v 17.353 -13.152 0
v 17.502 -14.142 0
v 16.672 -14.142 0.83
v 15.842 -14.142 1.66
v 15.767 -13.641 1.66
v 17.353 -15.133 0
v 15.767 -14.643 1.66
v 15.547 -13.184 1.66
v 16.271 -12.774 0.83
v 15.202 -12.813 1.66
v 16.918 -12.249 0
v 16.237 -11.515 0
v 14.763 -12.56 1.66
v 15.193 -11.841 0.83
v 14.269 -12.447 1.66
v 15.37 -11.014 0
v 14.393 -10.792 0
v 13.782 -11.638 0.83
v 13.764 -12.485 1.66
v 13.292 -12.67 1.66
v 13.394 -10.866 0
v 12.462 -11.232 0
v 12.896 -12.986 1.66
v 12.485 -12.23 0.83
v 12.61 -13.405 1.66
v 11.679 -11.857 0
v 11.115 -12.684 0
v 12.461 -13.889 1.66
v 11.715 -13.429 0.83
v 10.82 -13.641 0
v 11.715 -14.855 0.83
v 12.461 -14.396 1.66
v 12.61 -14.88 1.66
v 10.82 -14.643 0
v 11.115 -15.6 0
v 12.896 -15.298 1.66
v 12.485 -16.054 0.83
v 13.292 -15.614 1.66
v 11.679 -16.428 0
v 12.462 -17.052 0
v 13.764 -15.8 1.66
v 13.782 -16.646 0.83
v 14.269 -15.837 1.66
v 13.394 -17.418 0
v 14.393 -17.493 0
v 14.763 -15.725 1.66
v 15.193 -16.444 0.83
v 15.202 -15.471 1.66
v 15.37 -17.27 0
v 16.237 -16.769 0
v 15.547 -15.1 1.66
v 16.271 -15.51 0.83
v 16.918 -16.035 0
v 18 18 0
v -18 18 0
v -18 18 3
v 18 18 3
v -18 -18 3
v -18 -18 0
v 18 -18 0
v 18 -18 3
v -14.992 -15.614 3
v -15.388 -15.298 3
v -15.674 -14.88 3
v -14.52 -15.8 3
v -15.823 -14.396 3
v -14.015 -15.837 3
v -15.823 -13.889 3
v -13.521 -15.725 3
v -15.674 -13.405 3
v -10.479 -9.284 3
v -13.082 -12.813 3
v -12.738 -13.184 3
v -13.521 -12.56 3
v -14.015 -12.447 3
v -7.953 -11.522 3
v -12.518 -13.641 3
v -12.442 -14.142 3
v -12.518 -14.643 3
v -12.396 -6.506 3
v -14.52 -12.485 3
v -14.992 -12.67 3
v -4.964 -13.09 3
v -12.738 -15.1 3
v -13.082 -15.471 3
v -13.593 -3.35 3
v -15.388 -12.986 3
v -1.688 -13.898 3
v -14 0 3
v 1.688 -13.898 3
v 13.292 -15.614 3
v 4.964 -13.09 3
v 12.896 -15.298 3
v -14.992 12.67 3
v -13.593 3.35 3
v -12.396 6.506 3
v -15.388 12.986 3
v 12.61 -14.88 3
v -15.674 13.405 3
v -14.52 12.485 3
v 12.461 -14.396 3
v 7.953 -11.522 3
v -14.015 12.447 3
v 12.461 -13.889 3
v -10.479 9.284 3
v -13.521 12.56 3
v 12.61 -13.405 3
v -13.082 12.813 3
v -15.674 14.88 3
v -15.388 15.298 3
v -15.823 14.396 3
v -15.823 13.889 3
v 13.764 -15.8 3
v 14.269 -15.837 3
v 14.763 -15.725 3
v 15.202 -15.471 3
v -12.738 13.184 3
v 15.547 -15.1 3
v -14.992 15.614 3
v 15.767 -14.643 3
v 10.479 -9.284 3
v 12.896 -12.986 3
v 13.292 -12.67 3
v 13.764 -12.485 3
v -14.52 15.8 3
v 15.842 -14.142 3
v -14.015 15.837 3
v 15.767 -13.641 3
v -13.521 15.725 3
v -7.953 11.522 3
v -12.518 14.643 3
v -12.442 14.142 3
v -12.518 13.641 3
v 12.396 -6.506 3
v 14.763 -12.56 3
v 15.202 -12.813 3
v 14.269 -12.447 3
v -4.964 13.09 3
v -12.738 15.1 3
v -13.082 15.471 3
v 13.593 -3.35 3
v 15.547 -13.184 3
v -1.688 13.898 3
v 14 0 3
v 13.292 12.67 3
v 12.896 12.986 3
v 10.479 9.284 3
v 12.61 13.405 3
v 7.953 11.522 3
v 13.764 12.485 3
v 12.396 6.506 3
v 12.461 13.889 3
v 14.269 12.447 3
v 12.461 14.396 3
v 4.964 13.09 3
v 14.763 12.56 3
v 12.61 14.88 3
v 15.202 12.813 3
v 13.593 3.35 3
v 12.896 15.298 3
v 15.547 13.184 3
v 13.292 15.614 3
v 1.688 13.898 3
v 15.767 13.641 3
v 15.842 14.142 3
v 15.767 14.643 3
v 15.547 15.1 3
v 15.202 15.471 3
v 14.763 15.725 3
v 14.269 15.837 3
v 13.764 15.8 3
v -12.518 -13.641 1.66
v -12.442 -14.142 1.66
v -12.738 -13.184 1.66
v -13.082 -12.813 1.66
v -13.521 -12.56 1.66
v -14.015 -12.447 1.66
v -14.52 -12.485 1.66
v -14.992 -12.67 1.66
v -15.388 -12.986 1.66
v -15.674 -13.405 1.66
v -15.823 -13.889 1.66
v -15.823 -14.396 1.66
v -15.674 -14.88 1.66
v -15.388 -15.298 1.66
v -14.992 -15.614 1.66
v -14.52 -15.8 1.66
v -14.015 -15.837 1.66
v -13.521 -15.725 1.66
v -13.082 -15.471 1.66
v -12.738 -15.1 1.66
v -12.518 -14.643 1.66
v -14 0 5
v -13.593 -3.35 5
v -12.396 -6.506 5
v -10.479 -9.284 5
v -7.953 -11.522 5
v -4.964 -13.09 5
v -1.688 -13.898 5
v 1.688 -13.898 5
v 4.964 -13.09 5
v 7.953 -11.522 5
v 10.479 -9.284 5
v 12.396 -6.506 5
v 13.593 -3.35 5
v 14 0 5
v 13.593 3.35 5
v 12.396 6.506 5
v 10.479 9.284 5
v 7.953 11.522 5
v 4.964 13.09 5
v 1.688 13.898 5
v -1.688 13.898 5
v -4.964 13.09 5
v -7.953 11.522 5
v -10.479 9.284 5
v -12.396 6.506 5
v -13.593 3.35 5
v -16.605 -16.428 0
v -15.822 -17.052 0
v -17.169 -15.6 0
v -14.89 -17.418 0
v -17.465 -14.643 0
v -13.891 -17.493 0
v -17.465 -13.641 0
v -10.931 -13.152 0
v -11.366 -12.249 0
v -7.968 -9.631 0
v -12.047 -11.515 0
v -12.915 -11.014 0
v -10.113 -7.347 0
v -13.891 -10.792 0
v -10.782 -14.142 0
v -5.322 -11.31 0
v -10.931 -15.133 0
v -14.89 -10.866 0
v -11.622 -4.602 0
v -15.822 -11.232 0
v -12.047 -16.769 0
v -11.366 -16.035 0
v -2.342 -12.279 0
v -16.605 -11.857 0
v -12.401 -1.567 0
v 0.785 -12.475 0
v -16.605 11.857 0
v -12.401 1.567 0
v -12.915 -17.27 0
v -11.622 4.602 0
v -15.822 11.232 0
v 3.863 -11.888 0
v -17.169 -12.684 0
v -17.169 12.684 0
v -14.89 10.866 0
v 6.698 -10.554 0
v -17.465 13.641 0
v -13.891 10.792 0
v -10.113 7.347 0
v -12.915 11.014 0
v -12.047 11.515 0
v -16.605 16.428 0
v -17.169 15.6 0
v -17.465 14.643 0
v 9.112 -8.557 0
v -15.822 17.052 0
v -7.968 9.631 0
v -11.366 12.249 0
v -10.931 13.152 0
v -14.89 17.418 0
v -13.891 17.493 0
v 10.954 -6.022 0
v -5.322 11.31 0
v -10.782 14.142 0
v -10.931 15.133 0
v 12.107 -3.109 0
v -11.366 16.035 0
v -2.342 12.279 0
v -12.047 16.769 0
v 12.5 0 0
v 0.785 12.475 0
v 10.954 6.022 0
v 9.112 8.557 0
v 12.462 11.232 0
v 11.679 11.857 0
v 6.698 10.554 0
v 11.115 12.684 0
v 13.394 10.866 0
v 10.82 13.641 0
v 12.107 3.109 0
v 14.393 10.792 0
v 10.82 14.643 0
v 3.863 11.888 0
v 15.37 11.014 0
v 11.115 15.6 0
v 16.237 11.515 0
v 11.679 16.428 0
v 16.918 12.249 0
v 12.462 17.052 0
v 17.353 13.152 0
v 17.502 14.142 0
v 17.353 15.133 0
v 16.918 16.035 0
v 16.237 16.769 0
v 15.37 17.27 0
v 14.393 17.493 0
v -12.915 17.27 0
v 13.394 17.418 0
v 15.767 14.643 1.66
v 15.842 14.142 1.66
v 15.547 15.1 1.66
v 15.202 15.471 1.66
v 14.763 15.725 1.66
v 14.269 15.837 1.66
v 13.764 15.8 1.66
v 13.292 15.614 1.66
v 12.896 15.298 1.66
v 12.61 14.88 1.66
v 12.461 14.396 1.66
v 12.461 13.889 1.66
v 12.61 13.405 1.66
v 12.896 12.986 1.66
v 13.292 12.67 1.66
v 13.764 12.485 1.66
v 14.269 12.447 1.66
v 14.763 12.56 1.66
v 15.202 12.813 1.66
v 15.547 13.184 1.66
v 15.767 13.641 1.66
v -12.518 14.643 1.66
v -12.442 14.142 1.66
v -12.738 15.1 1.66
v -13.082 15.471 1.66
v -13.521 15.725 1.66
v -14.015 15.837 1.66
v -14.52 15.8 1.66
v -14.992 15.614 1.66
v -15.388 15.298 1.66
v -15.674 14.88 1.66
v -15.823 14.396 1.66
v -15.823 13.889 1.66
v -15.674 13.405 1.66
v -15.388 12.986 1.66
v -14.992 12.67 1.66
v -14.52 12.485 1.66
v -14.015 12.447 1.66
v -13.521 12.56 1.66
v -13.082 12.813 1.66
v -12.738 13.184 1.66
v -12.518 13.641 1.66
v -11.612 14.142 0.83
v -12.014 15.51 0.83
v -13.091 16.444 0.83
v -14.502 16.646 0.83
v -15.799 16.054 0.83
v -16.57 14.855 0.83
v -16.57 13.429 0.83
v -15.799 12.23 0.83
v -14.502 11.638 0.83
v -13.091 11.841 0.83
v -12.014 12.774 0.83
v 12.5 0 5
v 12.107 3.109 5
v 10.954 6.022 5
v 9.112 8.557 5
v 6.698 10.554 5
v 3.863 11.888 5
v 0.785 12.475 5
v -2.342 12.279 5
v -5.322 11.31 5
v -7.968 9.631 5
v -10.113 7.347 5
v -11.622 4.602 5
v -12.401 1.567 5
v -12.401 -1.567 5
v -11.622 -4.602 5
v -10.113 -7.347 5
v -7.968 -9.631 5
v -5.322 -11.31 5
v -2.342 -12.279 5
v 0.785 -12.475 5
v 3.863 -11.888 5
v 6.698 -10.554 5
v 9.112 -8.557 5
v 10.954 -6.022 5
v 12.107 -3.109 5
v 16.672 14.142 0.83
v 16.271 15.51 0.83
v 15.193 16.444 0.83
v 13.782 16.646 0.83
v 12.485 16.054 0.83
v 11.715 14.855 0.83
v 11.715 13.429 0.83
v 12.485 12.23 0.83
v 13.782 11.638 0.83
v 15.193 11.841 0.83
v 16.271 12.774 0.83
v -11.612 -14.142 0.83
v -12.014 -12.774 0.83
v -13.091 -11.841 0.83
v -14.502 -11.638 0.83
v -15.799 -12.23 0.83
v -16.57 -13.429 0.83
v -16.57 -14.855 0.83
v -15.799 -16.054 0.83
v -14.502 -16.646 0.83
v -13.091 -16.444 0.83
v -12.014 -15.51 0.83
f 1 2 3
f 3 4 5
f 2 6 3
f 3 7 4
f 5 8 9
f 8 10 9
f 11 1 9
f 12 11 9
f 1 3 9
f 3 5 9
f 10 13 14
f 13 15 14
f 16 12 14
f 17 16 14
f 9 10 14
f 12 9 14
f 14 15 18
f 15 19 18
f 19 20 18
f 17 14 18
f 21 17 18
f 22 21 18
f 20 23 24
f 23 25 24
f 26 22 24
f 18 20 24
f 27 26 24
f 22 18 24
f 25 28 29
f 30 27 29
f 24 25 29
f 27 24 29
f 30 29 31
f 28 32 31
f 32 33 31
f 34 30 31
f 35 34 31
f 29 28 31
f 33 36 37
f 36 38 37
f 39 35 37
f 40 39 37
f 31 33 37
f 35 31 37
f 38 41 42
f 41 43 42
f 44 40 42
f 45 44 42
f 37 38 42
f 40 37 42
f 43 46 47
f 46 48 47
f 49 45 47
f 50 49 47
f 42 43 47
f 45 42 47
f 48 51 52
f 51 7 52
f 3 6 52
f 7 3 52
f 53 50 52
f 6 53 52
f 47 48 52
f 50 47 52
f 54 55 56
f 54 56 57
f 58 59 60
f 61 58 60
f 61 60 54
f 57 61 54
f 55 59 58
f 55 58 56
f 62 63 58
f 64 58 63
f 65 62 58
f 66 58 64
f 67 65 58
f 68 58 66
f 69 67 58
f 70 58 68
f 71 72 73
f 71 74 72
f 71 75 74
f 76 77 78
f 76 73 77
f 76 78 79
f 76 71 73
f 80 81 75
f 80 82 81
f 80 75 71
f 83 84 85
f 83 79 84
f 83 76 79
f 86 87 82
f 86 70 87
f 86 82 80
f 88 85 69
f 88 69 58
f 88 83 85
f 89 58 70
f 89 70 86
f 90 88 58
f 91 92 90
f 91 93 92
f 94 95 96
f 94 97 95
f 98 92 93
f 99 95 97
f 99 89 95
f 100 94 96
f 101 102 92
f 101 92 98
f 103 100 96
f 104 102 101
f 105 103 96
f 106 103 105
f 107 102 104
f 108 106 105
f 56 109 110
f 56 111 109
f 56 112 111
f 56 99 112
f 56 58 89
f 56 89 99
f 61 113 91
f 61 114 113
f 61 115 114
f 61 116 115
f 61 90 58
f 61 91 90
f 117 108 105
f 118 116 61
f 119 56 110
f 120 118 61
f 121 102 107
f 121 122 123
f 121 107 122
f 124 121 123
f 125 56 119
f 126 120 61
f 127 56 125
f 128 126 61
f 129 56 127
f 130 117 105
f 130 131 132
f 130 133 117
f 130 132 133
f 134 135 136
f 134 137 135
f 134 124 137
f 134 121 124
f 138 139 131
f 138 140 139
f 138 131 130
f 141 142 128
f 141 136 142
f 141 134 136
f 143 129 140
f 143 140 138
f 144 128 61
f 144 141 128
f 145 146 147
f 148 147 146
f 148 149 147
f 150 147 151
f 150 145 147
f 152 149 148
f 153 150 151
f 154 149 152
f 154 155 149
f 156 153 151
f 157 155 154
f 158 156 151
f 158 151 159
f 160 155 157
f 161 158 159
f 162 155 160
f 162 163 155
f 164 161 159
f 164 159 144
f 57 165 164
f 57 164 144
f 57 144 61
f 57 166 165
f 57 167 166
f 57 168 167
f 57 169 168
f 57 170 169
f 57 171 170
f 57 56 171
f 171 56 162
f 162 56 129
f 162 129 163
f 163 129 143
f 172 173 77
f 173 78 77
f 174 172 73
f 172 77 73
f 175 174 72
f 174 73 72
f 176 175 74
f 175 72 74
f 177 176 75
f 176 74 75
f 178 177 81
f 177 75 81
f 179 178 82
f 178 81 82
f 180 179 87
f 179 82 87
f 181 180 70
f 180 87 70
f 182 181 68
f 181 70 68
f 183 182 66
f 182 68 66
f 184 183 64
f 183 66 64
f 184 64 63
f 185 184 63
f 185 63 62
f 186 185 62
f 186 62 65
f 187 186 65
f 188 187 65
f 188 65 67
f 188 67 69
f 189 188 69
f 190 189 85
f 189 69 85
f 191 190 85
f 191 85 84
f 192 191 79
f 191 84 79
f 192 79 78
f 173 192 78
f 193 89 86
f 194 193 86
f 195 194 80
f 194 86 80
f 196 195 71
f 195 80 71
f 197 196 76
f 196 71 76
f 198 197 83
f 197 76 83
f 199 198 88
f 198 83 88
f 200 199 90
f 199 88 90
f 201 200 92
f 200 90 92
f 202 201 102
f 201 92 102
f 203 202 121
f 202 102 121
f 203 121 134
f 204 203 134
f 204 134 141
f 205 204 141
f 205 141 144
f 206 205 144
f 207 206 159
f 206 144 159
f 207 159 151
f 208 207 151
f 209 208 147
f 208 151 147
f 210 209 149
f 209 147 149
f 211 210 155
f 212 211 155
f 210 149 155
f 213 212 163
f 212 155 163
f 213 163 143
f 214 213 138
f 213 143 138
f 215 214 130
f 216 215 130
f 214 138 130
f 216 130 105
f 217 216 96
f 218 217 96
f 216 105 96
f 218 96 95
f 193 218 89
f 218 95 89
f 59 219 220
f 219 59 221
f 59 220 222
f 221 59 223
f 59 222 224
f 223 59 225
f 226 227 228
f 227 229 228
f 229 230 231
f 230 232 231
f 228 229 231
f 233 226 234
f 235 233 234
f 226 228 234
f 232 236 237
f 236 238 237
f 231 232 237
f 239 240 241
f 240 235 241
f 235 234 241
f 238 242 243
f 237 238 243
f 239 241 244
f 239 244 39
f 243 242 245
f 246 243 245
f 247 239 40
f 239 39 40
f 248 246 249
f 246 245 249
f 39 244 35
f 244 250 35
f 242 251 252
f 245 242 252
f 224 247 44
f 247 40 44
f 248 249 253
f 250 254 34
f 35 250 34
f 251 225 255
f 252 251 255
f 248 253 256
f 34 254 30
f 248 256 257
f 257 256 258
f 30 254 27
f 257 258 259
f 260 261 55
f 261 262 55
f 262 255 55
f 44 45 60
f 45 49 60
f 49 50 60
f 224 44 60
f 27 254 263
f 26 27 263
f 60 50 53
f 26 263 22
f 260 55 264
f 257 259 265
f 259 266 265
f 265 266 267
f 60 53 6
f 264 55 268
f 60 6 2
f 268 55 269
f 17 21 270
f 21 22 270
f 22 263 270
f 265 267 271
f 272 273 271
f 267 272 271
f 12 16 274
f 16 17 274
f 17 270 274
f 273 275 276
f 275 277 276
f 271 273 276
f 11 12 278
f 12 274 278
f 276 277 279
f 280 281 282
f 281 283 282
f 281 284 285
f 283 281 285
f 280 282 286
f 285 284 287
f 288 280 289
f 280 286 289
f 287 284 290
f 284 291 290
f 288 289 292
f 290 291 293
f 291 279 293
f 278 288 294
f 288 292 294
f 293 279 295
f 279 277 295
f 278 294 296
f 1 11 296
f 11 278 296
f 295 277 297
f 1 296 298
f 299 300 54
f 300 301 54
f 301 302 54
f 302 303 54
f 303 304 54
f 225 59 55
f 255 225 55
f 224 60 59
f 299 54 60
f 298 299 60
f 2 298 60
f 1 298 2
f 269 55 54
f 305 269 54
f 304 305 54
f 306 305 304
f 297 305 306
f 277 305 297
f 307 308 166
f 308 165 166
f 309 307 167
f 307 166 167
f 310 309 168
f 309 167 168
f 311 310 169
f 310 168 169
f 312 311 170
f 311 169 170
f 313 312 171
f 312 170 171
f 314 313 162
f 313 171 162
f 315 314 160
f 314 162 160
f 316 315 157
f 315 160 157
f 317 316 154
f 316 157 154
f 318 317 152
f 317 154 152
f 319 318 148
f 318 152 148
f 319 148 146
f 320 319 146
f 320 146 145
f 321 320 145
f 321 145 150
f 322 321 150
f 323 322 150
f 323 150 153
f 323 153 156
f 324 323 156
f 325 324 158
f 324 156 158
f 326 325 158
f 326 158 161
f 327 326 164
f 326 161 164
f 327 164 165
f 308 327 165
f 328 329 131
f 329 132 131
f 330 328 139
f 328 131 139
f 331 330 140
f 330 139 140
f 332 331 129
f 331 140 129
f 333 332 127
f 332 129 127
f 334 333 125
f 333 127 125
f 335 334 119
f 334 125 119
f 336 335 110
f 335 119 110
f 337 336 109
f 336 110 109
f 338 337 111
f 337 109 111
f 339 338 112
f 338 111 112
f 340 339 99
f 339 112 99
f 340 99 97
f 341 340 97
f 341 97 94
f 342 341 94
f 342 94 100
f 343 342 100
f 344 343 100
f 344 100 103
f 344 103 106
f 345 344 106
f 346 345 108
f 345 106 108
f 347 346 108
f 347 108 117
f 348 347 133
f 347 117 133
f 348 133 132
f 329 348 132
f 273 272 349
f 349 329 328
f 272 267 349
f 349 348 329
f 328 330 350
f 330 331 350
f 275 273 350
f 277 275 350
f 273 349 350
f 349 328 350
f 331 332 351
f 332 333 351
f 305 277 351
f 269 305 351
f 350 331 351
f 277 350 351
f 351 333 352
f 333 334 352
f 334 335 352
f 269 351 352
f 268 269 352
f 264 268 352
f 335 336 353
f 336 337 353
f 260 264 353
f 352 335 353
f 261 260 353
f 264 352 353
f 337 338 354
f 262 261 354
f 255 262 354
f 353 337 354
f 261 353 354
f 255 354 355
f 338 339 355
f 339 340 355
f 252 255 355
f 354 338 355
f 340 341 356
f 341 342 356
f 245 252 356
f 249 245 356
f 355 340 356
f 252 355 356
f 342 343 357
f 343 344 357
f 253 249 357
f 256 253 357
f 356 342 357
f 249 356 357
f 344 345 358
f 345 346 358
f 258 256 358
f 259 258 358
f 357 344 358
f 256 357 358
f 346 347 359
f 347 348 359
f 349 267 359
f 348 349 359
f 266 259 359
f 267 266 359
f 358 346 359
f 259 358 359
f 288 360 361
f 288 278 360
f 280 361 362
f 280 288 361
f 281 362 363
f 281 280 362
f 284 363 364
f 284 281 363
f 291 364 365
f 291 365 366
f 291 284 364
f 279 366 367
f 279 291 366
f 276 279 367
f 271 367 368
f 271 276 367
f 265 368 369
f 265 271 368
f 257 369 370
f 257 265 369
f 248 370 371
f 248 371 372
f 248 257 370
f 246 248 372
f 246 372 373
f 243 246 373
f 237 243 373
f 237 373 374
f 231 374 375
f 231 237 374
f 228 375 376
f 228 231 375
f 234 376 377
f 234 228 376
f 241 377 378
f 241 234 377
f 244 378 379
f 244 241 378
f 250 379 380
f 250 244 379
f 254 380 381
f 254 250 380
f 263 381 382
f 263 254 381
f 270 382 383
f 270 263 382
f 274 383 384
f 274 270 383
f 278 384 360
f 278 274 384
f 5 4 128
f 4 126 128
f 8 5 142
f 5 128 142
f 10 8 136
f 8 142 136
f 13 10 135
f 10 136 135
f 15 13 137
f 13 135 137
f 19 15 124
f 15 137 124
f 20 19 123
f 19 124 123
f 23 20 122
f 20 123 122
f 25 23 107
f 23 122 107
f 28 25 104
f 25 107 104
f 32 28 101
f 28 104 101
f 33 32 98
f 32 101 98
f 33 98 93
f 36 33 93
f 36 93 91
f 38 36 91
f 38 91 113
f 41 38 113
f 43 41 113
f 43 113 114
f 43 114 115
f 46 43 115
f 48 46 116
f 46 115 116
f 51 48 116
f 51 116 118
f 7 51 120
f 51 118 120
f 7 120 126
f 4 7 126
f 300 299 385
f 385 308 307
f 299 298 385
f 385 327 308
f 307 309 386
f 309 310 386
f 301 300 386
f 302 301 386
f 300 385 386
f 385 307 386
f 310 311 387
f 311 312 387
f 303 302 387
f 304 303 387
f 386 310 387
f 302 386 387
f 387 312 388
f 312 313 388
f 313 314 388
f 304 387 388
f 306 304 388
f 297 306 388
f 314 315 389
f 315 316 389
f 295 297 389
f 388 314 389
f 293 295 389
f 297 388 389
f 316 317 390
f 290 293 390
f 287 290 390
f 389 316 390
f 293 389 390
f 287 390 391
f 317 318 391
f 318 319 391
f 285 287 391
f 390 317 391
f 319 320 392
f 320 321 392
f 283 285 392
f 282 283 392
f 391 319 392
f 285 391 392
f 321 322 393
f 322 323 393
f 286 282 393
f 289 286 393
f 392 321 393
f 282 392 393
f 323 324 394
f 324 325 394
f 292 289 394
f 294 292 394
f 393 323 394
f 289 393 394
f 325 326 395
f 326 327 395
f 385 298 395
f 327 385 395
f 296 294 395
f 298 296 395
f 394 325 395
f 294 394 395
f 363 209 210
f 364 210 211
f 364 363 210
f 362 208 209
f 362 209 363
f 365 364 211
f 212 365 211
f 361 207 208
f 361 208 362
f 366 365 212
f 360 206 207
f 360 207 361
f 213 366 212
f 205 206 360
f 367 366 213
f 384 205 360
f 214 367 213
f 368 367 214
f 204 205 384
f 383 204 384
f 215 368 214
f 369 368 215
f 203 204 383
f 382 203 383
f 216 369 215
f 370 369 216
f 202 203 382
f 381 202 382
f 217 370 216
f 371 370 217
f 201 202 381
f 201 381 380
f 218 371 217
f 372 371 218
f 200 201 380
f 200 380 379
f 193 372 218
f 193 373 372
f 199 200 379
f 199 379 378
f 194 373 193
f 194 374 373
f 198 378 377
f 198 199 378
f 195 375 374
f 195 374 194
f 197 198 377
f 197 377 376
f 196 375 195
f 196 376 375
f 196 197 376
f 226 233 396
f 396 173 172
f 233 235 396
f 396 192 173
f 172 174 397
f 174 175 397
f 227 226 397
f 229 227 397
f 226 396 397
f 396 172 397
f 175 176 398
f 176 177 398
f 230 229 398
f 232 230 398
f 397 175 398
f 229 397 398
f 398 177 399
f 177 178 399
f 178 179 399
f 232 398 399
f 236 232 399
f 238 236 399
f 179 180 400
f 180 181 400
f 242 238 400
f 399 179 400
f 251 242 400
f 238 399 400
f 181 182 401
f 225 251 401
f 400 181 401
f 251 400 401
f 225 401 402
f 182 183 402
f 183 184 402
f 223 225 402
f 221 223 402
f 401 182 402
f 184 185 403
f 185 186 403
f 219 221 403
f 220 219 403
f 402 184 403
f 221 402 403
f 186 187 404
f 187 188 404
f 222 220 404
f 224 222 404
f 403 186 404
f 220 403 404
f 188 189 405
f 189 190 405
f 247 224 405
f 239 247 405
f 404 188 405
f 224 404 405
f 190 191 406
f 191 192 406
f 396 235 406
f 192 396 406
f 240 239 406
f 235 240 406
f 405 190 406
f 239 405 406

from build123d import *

# Parameters (mm, degrees)
ESBO_O1_W                            = 36
ESBO_O1_H                            = 36
ESBO_O1_R                            = 12.5
RESSALTO_EXTRUS_O1_DEPTH             = 3
ESBO_O2_R                            = 14
ESBO_O2_R_2                          = 12.5
RESSALTO_EXTRUS_O2_DEPTH             = 2
ESCAREADO_PARA_SFHCS_M32_D           = 3.4
ESCAREADO_PARA_SFHCS_M32_CSINK_D     = 6.72
ESCAREADO_PARA_SFHCS_M32_CSINK_ANGLE = 90


with BuildPart() as part:
    # Esboço1 → Ressalto-extrusão1 (new body)
    with BuildSketch(Plane.XY):
        Rectangle(ESBO_O1_W, ESBO_O1_H)
        Circle(ESBO_O1_R, mode=Mode.SUBTRACT)
    extrude(amount=RESSALTO_EXTRUS_O1_DEPTH)

    # Esboço2 → Ressalto-extrusão2 (add)
    with BuildSketch(Plane.XY.offset(3)):
        with Locations(Location((0, 0, 0), (0, 0, 180))):
            Circle(ESBO_O2_R)
        Circle(ESBO_O2_R_2, mode=Mode.SUBTRACT)
    extrude(amount=RESSALTO_EXTRUS_O2_DEPTH)

    # Escareado para SFHCS M32 (through all)
    with Locations(Plane(origin=(0, 0, 0), x_dir=(-1, 0, 0), z_dir=(0, 0, -1))):
        with Locations((-14.142135624, 14.142135624), (14.142135624, 14.142135624), (14.142135624, -14.142135624), (-14.142135624, -14.142135624)):
            CounterSinkHole(ESCAREADO_PARA_SFHCS_M32_D / 2, ESCAREADO_PARA_SFHCS_M32_CSINK_D / 2, counter_sink_angle=ESCAREADO_PARA_SFHCS_M32_CSINK_ANGLE)


solid = part.part
